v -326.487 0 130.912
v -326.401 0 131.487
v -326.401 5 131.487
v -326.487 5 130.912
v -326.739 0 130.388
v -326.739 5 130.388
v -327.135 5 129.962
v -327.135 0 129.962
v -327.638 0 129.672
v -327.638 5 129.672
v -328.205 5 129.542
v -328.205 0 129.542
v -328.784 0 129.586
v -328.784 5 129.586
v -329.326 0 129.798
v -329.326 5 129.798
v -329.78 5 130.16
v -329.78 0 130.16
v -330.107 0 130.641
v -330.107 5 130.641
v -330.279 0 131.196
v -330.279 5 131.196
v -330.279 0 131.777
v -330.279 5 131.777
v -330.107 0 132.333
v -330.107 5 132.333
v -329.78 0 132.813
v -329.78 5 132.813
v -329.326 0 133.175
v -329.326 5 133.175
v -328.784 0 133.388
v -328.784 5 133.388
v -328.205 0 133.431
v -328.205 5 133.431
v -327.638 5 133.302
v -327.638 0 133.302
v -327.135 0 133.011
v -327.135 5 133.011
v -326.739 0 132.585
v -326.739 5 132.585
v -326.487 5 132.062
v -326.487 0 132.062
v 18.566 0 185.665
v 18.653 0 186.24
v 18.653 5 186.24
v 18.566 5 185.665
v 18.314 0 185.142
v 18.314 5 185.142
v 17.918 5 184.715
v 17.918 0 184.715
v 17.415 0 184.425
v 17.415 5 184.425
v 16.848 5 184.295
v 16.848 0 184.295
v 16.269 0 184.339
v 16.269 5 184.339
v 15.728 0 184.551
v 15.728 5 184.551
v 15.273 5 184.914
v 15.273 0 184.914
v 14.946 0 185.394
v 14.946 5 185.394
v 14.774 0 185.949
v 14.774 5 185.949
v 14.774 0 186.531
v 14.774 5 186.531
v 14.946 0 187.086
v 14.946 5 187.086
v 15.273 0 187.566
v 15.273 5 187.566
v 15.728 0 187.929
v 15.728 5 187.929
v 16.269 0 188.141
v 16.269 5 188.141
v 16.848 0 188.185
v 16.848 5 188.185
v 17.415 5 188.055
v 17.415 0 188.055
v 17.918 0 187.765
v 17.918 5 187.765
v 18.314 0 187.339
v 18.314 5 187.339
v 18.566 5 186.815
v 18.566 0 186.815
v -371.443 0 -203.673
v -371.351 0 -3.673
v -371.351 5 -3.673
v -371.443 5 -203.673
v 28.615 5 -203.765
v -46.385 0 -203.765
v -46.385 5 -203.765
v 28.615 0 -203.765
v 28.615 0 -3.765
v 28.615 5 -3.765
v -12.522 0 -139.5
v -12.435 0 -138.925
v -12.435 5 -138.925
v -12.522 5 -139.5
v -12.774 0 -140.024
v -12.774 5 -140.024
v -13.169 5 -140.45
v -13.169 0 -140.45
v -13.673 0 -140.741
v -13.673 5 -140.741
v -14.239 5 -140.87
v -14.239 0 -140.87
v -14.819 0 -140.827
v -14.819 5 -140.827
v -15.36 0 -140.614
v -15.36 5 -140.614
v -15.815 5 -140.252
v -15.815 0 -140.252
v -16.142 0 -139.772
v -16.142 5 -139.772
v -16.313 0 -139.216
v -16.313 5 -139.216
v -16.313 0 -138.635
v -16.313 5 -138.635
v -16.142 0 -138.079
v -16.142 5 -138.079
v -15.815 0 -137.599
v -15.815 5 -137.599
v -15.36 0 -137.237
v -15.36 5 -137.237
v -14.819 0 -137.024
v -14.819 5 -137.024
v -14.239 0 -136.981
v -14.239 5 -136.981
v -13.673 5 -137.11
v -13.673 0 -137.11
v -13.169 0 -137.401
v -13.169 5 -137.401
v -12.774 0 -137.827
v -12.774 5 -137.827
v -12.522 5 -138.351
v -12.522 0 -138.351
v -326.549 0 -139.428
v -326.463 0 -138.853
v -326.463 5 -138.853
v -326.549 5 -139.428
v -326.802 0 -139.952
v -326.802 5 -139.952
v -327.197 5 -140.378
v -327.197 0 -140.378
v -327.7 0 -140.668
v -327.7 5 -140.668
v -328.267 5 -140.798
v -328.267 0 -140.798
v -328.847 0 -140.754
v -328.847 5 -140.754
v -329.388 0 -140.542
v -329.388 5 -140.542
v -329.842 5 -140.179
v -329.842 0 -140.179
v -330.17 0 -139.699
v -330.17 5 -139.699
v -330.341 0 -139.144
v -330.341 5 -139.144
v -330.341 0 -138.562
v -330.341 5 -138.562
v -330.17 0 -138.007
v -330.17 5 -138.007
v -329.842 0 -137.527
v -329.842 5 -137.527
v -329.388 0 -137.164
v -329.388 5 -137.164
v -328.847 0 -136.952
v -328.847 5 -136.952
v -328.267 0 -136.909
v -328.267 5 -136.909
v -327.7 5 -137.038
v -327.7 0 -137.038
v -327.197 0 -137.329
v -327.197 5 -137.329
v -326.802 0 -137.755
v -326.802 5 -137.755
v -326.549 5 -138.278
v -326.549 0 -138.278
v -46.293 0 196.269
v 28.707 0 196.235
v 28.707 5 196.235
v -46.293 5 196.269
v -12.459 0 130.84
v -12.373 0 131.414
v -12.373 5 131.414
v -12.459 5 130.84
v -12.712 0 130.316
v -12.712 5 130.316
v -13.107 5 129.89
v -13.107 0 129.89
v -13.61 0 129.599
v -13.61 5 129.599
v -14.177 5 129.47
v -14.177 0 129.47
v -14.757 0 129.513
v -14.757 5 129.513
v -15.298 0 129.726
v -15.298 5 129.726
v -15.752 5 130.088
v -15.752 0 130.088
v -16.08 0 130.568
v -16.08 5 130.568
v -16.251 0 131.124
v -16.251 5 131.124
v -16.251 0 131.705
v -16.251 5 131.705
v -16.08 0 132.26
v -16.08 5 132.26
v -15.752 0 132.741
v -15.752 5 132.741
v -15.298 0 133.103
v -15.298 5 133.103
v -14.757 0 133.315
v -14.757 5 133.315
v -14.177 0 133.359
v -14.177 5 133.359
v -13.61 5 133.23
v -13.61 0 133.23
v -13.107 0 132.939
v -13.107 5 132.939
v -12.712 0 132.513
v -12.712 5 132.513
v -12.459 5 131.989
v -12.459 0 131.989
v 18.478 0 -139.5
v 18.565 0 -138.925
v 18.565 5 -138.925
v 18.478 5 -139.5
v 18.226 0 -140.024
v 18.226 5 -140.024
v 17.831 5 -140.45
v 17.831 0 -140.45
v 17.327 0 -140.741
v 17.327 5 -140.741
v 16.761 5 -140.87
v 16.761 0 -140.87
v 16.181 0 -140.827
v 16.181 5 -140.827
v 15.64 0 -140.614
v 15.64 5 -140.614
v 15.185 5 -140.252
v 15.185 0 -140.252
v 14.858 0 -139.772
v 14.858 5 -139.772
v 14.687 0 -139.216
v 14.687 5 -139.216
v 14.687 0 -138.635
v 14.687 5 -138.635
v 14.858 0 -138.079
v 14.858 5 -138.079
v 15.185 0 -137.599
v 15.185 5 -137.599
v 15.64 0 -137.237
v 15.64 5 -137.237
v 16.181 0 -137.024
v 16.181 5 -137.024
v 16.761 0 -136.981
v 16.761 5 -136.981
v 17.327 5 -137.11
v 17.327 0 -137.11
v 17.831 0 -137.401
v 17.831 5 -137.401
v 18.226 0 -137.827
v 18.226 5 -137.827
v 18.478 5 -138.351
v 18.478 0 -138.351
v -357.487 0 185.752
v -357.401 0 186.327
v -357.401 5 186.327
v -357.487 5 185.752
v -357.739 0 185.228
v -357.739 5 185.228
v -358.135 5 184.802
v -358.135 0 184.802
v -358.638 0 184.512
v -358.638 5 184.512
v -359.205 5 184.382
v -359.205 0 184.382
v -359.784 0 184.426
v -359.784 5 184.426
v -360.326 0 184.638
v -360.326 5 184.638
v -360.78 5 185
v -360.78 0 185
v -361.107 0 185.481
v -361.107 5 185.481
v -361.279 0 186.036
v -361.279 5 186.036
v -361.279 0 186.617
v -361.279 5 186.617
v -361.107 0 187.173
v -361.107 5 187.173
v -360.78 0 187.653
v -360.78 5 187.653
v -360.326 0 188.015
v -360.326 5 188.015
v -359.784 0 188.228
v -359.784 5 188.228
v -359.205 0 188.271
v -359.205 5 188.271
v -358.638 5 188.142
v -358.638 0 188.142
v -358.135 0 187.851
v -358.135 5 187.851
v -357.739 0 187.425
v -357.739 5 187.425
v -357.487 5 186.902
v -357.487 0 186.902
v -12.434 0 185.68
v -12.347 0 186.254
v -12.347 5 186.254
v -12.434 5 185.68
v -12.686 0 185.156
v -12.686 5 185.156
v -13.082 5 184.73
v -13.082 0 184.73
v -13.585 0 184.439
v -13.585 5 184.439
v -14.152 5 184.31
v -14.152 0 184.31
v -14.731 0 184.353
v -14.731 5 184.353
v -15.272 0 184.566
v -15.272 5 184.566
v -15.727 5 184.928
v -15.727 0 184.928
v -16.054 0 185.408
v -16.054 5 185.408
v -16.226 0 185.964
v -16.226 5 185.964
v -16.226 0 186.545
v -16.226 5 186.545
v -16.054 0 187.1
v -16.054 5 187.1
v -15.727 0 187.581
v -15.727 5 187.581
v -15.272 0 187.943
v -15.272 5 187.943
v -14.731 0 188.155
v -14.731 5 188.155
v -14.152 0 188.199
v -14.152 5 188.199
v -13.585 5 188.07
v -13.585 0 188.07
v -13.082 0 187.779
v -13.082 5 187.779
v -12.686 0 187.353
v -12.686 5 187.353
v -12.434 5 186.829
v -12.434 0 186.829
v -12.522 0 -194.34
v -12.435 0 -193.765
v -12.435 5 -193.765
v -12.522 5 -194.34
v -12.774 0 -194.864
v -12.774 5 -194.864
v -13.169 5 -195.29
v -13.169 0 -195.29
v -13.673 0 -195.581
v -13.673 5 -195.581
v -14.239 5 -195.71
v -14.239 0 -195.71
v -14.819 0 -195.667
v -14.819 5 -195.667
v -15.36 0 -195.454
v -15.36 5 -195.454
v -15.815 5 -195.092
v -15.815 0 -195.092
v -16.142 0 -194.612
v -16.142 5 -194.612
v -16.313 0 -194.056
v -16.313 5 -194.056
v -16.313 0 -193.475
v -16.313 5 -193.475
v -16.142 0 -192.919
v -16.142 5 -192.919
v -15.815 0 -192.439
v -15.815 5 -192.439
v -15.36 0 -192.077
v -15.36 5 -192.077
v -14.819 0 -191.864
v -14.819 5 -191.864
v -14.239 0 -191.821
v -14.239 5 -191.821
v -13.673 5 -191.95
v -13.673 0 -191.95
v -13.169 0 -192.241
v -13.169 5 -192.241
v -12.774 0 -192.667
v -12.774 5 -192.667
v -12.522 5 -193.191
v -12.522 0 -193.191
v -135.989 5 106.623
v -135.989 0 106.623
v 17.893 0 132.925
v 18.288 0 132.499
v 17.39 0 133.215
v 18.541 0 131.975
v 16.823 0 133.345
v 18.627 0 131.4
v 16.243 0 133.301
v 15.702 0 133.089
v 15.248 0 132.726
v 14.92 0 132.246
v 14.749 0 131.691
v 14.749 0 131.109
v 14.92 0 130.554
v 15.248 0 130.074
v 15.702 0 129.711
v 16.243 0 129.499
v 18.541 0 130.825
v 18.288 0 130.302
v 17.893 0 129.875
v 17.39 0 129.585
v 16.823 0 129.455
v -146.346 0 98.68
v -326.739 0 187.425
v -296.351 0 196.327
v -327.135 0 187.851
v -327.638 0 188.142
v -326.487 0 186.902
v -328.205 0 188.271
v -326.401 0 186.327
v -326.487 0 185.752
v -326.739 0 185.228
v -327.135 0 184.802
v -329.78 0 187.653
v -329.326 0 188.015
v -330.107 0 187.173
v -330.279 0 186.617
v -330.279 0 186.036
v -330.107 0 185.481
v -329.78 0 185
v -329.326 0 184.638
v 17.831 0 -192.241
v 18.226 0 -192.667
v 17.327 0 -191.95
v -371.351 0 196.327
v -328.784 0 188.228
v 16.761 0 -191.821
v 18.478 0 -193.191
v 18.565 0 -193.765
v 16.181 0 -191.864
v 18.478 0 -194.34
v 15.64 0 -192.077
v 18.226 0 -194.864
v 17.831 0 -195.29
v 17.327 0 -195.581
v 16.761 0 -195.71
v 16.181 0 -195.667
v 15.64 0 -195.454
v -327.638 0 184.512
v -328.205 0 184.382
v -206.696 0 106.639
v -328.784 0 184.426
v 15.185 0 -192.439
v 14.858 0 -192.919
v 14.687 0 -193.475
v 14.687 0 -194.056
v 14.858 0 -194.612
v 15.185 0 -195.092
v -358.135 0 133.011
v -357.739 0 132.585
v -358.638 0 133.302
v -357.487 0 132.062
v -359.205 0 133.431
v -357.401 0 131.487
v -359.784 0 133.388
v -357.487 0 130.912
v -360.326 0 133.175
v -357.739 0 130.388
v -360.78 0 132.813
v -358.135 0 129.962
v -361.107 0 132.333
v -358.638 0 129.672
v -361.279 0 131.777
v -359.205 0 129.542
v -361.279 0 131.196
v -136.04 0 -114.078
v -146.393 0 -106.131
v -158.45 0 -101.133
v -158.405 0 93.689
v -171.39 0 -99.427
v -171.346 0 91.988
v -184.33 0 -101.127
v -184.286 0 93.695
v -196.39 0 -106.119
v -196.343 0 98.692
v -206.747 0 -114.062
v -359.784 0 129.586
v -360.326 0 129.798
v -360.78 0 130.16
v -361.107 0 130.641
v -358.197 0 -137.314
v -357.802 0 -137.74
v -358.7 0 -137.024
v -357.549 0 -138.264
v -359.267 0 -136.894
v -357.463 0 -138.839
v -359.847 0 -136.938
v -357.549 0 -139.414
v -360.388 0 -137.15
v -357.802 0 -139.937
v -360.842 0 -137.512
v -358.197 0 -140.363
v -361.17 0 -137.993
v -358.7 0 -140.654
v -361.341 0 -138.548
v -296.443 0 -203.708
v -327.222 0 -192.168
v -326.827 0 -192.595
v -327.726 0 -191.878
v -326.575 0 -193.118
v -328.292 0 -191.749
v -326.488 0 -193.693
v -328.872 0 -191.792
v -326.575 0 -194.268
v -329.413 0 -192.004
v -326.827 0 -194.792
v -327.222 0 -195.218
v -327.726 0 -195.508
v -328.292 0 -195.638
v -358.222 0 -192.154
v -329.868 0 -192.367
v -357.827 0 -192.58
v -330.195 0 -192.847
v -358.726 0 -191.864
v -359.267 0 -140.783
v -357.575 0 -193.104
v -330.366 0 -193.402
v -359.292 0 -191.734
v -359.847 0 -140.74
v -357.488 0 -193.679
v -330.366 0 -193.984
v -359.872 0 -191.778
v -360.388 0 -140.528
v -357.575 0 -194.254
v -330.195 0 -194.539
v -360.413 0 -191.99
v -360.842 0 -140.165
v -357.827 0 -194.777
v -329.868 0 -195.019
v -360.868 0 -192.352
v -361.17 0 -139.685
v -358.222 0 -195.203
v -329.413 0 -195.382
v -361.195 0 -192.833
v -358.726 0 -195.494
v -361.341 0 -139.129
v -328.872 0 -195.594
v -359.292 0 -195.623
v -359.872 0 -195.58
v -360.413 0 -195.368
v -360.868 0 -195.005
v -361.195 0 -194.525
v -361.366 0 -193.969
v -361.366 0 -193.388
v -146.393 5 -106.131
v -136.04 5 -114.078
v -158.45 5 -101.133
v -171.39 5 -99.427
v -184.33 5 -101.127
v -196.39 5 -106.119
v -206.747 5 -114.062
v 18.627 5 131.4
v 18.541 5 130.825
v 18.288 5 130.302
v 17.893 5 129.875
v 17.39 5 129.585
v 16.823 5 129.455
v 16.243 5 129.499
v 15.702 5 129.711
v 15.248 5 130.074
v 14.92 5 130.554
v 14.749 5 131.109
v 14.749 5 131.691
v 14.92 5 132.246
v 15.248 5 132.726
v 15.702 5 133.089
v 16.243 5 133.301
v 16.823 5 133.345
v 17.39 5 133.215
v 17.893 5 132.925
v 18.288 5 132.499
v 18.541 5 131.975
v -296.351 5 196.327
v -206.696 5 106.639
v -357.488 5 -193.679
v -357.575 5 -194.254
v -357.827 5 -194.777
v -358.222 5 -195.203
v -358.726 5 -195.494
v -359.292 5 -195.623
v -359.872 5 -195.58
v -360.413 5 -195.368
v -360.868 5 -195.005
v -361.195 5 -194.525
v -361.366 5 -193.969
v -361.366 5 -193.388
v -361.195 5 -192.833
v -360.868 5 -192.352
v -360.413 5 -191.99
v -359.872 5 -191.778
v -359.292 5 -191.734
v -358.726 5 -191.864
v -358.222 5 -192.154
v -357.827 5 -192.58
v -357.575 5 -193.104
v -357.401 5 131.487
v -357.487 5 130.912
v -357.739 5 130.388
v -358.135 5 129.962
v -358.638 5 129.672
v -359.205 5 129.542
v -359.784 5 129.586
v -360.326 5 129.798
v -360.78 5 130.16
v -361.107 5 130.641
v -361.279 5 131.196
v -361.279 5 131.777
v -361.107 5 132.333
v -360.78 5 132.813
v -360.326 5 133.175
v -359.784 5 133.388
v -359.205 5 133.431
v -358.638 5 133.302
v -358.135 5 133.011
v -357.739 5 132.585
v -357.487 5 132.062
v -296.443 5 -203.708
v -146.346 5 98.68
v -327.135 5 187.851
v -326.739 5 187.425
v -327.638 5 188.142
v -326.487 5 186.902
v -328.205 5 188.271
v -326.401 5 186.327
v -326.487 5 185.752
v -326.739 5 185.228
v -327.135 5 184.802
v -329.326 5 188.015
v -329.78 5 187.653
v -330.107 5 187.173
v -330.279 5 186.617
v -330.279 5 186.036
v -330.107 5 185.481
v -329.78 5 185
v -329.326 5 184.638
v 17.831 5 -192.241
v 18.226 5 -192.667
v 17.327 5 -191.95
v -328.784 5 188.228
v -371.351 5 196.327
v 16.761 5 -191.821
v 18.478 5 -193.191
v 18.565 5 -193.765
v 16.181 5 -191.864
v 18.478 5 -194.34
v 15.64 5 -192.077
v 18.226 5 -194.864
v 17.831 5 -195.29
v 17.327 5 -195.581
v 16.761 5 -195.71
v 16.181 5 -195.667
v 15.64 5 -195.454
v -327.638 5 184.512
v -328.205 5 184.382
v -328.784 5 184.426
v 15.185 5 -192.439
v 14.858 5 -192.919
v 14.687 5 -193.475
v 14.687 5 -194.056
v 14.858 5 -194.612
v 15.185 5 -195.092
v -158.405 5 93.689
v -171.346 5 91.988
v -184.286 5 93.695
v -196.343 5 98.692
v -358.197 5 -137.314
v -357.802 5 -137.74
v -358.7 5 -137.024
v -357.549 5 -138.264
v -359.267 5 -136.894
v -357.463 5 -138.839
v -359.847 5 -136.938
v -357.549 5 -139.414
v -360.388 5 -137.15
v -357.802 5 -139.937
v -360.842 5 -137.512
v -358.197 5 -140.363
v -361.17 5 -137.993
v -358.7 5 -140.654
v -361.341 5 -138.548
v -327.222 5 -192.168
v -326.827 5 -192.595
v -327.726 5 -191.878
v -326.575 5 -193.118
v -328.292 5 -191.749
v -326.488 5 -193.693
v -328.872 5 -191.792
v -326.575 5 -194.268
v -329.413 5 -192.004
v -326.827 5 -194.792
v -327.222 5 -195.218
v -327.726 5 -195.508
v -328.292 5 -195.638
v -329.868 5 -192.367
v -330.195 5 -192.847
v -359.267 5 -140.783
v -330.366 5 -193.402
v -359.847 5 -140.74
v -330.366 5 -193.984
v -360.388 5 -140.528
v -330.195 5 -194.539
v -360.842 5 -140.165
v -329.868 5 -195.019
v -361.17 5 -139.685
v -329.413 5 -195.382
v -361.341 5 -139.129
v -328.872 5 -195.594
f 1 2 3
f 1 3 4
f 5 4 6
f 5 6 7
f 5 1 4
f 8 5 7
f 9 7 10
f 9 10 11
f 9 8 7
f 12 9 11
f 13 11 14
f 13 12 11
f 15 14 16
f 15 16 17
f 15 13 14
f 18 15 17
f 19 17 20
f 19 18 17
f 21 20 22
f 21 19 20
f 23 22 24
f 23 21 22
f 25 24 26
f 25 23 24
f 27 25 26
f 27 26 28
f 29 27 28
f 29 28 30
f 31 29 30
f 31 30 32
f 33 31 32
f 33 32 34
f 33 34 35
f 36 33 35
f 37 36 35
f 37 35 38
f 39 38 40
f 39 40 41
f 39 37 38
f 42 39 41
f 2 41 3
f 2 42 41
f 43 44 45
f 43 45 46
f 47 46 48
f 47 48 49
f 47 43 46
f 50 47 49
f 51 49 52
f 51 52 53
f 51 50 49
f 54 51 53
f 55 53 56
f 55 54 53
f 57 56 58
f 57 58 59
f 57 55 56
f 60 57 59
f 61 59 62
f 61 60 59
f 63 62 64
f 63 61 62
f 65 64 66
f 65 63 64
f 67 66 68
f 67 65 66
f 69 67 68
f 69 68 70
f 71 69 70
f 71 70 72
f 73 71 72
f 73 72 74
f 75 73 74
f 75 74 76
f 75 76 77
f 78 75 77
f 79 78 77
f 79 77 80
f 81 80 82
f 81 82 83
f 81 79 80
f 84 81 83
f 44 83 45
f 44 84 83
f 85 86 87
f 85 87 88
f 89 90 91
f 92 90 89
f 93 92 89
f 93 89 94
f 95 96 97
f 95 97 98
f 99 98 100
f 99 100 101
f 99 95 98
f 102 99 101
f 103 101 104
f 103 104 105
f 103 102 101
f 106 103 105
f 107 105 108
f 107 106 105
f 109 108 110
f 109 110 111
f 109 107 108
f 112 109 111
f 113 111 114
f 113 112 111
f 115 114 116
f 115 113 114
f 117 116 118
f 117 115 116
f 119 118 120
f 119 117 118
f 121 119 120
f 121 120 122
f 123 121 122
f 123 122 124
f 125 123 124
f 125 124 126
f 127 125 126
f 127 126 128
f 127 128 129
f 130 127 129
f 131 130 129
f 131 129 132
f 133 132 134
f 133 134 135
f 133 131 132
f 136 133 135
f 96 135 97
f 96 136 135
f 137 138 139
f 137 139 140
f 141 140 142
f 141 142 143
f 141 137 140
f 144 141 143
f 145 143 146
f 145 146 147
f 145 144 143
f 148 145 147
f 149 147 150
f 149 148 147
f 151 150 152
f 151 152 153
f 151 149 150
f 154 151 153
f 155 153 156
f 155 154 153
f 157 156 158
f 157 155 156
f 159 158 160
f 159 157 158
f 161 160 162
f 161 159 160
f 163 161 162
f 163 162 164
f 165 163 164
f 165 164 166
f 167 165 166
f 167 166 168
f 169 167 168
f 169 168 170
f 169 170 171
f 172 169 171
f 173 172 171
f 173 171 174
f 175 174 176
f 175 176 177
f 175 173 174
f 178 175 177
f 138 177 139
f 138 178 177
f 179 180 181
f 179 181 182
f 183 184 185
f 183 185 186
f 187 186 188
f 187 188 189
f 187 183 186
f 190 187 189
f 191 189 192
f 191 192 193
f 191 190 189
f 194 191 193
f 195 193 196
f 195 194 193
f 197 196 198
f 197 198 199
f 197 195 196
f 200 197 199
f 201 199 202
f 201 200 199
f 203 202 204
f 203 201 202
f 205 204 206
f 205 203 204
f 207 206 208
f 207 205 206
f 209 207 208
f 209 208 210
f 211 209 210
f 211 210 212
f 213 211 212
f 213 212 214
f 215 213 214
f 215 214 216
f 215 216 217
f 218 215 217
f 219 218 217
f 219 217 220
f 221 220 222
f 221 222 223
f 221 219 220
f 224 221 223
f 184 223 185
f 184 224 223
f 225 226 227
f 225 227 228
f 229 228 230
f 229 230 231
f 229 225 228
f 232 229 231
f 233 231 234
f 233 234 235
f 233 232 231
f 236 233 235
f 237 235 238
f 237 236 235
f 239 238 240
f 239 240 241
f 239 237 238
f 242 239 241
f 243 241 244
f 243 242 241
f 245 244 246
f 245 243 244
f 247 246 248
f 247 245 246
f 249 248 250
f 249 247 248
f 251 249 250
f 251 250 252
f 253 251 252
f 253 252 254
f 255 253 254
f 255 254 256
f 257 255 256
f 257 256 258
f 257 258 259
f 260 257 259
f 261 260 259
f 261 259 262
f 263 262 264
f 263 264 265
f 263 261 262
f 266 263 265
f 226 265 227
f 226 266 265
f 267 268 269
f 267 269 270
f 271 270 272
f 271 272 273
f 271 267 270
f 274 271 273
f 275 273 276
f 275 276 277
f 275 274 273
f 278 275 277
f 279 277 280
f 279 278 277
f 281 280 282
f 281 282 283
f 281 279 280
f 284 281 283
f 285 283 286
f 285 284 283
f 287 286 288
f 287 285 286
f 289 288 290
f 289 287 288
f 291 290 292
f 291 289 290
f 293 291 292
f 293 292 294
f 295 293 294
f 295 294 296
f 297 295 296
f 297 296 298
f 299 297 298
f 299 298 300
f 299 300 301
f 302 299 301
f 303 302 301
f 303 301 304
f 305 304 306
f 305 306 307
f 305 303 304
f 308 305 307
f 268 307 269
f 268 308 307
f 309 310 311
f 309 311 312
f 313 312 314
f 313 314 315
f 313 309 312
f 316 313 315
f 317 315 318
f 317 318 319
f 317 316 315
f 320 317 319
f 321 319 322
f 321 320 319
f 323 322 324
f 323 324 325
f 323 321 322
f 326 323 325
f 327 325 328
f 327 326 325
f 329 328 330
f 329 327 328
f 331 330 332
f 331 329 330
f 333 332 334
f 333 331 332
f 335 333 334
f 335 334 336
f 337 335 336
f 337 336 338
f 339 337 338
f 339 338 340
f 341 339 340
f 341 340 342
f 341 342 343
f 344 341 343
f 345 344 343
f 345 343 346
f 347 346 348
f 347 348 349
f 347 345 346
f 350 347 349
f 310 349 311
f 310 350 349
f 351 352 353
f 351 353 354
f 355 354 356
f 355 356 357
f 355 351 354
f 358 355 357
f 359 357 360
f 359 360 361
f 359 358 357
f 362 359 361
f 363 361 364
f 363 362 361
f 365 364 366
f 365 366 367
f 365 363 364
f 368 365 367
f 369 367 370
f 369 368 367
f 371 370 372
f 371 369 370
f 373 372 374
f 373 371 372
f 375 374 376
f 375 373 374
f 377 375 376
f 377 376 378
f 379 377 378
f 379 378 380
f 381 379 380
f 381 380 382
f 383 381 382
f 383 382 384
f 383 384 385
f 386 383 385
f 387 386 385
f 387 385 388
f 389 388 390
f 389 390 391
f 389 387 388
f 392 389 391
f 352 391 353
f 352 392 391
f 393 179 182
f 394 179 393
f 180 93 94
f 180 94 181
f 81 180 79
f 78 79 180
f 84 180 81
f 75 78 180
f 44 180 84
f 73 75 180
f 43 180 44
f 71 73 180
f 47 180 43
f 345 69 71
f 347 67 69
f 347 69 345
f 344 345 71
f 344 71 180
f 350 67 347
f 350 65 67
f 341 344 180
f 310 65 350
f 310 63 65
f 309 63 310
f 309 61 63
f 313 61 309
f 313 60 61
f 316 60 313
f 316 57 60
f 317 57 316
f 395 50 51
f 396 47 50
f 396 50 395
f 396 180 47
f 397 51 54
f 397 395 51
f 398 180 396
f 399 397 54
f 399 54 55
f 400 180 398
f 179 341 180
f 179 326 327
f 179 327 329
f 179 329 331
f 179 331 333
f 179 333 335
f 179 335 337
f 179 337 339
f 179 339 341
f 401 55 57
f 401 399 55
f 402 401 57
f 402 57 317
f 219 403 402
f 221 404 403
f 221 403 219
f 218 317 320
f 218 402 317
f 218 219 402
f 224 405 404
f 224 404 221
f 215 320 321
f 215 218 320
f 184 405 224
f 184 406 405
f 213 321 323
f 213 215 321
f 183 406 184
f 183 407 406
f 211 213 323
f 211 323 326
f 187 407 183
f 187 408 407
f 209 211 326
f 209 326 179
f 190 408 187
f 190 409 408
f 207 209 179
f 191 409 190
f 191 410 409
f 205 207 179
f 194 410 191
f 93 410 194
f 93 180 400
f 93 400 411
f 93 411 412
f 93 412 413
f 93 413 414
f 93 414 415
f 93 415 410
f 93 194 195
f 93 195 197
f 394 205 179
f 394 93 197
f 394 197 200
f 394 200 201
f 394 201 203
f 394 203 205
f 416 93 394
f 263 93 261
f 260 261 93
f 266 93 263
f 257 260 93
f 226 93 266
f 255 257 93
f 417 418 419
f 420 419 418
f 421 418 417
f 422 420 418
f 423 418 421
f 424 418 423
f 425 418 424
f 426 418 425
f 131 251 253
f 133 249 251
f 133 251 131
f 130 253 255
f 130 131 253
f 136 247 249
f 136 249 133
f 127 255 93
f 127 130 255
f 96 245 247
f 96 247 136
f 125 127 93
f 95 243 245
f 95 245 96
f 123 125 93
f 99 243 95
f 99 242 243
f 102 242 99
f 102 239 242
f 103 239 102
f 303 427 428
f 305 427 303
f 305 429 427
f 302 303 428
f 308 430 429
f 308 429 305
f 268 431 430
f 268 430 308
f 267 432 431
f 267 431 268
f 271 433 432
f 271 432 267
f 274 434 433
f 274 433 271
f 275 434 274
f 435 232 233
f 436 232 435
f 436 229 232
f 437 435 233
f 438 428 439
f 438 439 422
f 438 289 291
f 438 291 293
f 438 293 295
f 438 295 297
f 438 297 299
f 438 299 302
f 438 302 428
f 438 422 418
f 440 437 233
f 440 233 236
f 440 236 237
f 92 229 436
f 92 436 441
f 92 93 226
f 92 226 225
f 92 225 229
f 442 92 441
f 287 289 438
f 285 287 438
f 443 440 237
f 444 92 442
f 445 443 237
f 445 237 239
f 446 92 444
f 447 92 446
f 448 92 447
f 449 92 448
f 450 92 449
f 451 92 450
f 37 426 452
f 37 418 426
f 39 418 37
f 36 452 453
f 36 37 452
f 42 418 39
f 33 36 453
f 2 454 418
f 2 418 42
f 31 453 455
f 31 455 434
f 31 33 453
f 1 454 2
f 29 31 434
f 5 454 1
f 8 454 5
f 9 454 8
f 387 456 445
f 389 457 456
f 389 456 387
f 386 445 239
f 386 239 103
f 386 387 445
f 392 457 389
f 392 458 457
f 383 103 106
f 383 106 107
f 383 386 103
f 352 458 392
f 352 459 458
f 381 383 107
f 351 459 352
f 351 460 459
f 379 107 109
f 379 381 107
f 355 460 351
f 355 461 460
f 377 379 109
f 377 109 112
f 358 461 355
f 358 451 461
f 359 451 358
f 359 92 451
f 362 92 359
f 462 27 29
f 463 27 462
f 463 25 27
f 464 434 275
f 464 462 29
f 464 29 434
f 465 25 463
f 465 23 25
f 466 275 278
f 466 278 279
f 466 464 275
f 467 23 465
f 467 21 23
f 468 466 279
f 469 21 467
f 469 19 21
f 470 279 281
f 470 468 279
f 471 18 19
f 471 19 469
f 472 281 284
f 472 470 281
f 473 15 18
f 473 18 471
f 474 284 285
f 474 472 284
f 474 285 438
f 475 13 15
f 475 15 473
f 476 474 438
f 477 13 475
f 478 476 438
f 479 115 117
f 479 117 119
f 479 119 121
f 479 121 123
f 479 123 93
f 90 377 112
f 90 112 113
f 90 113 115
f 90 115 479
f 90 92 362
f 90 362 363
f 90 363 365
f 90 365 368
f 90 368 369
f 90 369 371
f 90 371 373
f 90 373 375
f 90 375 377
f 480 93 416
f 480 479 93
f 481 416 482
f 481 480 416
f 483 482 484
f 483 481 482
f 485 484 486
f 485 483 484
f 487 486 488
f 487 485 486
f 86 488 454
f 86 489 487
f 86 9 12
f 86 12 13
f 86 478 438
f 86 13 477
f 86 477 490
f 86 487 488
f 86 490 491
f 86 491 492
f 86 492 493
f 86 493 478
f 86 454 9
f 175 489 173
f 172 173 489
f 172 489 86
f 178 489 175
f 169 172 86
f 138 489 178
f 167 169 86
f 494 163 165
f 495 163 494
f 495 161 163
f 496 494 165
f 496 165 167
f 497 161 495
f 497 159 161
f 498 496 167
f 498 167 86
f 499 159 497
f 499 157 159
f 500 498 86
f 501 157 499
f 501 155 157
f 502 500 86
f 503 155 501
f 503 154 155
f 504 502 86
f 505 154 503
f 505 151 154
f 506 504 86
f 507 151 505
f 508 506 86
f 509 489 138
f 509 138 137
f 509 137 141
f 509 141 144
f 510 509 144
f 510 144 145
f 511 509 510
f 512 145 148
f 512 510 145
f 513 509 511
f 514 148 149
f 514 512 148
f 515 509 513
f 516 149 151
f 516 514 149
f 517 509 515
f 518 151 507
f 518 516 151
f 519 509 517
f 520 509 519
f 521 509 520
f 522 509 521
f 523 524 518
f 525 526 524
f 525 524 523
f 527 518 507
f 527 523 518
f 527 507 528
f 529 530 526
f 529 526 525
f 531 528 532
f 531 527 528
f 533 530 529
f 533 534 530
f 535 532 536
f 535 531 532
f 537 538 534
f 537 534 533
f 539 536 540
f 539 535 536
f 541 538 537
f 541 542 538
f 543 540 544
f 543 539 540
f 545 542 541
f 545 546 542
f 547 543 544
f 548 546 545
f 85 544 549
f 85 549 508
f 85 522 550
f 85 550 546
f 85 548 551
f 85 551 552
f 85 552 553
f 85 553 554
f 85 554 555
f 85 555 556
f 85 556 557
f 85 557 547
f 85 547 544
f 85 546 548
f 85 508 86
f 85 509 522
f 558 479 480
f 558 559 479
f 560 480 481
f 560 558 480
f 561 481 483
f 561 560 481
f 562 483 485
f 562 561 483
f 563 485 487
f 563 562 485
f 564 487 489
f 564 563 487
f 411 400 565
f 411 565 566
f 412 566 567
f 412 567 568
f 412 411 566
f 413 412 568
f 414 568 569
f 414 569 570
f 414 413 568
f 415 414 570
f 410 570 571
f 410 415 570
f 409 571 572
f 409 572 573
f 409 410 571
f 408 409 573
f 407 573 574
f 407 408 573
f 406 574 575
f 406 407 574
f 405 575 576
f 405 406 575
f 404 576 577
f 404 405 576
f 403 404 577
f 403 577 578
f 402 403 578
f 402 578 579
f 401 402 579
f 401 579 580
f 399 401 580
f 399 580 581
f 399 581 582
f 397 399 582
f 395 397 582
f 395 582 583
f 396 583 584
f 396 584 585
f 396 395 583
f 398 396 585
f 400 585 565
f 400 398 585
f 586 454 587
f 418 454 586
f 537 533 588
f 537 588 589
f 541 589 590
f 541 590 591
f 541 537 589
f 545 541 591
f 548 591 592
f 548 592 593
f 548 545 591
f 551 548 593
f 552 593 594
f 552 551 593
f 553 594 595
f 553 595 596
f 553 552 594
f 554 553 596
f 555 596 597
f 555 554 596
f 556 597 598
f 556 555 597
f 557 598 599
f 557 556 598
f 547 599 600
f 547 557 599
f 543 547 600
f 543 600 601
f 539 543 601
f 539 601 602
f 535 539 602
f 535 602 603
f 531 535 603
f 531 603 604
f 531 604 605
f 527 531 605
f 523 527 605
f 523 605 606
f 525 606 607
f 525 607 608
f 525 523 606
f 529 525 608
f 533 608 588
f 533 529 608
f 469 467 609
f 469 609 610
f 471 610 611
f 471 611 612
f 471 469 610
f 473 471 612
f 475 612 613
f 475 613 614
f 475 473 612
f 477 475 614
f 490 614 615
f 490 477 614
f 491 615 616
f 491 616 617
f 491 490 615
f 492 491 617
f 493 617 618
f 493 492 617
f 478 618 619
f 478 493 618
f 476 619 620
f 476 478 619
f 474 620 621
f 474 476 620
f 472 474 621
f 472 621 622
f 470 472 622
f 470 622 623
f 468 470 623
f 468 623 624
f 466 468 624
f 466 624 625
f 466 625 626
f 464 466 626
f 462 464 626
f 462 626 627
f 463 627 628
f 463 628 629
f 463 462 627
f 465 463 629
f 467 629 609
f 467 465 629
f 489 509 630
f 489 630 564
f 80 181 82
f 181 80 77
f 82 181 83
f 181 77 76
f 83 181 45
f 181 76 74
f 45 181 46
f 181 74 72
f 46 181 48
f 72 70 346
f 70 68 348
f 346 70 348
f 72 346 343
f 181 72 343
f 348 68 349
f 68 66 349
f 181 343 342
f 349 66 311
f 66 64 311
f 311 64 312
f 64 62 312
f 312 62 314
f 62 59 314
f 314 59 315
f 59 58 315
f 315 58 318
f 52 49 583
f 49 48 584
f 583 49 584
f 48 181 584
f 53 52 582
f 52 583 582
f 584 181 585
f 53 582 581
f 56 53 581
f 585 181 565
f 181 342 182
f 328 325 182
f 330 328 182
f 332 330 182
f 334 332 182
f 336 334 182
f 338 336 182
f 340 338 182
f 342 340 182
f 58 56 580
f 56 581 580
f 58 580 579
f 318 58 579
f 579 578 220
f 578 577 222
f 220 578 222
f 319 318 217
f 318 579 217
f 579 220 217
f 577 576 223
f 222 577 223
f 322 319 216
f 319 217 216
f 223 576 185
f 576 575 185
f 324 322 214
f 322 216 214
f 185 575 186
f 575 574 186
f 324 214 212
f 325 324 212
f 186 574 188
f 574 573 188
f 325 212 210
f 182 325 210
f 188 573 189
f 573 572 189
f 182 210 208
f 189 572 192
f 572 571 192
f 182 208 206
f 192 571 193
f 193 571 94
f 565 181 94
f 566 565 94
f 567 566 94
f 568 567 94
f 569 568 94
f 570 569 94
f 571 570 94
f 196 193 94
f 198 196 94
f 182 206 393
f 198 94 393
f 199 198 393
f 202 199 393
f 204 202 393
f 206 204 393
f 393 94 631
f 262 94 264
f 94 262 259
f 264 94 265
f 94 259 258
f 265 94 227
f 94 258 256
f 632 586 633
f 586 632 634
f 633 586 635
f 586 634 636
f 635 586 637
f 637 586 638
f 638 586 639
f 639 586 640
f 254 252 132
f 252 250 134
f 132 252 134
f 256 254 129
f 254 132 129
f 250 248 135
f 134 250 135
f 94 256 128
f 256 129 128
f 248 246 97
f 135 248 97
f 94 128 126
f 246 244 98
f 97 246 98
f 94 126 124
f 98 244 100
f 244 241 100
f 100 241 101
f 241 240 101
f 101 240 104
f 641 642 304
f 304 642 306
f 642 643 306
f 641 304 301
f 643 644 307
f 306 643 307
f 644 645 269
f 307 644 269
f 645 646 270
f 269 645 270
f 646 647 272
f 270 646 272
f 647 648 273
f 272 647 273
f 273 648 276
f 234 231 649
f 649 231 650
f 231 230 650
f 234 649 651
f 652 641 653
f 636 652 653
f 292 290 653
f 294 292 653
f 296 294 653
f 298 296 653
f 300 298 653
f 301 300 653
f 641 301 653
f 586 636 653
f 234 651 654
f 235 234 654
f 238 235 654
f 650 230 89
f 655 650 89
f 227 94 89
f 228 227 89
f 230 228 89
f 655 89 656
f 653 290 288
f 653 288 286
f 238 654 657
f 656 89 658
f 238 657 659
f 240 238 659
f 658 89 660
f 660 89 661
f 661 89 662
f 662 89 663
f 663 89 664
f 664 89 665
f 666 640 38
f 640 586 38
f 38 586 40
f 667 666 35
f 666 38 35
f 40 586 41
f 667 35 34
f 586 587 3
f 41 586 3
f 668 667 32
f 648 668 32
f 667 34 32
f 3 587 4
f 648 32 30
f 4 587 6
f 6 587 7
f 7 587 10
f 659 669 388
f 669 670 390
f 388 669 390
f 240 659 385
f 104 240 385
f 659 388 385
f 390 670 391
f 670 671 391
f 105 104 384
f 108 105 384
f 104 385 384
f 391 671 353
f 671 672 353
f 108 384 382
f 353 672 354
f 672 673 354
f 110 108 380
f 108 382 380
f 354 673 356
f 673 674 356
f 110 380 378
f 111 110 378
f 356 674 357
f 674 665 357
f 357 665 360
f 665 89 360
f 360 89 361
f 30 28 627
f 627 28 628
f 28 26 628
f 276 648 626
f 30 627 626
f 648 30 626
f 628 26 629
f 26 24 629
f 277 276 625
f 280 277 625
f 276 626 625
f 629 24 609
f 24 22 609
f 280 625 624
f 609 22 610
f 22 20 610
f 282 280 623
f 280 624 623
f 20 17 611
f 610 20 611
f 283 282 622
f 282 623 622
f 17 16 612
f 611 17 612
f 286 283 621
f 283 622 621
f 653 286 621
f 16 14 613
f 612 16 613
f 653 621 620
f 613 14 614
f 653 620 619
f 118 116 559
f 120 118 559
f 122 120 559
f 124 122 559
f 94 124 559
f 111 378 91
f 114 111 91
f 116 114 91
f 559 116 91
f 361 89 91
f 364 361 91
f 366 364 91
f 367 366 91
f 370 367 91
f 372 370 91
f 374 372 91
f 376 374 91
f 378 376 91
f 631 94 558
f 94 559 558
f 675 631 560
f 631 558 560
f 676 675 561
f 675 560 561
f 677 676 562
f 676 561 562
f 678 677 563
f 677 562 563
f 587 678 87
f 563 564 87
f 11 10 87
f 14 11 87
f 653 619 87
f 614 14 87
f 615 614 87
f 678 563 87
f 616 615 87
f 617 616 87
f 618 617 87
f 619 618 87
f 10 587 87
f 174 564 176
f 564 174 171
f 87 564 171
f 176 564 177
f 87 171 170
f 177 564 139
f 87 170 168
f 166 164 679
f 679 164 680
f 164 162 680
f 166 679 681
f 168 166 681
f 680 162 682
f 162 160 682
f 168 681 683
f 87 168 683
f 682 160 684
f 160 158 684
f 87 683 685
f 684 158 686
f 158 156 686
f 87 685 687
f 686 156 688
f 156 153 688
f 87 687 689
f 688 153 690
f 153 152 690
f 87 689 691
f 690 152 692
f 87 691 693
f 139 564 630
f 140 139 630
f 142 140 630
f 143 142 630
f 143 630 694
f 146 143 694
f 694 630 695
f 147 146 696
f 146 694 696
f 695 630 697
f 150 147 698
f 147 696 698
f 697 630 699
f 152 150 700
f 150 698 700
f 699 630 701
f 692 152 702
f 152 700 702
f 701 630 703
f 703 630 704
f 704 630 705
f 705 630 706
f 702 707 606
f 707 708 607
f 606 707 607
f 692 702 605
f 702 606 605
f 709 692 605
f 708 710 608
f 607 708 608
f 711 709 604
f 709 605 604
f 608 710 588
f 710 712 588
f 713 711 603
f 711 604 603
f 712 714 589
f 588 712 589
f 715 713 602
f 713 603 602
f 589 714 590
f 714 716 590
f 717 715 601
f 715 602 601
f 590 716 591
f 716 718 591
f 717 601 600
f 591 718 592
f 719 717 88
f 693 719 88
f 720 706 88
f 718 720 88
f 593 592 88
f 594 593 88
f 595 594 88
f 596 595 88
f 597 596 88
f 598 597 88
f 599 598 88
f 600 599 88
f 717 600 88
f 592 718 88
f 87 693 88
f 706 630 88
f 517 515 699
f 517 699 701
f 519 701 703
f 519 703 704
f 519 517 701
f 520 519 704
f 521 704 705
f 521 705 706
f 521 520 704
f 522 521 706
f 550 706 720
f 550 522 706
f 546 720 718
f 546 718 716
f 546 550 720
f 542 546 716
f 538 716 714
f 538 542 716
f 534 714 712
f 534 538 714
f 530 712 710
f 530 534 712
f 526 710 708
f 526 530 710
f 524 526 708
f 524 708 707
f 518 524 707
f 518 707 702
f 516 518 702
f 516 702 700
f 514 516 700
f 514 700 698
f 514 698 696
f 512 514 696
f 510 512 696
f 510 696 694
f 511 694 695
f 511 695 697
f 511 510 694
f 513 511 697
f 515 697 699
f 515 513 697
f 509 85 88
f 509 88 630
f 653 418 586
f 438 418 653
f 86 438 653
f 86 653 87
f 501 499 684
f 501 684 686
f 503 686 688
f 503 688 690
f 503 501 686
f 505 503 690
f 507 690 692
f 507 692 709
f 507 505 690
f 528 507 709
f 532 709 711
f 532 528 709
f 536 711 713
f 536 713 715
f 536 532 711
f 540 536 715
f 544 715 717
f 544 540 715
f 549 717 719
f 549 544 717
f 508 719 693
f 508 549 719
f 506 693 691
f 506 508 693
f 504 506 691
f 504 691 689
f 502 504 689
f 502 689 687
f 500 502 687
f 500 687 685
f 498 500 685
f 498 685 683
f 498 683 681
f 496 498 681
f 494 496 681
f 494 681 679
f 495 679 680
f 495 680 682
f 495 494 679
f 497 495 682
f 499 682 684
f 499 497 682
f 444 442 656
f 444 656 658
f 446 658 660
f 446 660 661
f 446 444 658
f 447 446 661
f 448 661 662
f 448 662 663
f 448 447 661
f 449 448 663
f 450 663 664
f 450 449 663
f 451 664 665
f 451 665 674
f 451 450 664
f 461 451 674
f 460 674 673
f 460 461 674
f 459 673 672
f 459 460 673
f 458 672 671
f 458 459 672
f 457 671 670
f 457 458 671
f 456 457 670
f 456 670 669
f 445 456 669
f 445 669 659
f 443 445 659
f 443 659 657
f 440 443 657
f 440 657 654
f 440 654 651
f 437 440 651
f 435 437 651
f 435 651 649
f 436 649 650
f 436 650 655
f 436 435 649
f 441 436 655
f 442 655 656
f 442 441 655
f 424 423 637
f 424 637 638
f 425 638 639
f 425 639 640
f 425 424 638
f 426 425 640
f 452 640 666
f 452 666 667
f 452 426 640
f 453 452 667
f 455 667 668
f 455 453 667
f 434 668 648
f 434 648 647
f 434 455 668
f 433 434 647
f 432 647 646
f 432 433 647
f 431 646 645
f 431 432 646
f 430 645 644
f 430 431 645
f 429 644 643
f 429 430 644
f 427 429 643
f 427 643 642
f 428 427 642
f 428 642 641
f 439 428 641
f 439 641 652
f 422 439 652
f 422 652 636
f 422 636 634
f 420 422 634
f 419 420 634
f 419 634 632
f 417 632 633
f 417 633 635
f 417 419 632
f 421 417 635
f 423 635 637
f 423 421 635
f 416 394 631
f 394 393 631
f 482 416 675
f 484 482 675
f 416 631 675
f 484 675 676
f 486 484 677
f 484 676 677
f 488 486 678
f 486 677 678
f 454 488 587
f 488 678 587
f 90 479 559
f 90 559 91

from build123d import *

# Parameters (mm, degrees)
SKETCH1_R           = 1.95
BOSS_EXTRUDE1_DEPTH = 5
FILLET1_R           = 50


with BuildPart() as part:
    # Sketch1 → Boss-Extrude1 (new body)
    with BuildSketch(Plane(origin=(0, 0, 0), x_dir=(1, 0, 0), z_dir=(0, 1, 0))):
        Polygon((-171.385103045, 78.719364296), (-46.385103045, 203.765478515), (28.614896955, 203.765478515), (28.614896955, 3.765478515), (28.707125389, -196.23450022), (-46.292866637, -196.269085883), (-171.350517383, -71.28062773), (-296.350517383, -196.326741949), (-371.350517383, -196.326741949), (-371.350517383, 3.673258051), (-371.442745817, 203.673236785), (-296.442753791, 203.707822448), align=None)
        with Locations((16.614896955, 193.765478515)):
            Circle(SKETCH1_R, mode=Mode.SUBTRACT)
        with Locations((-14.385103045, 193.765478515)):
            Circle(SKETCH1_R, mode=Mode.SUBTRACT)
        with Locations((-14.385103045, 138.925478515)):
            Circle(SKETCH1_R, mode=Mode.SUBTRACT)
        with Locations((16.614896955, 138.925478515)):
            Circle(SKETCH1_R, mode=Mode.SUBTRACT)
        with Locations((16.677226206, -131.40004082)):
            Circle(SKETCH1_R, mode=Mode.SUBTRACT)
        with Locations((-14.322770498, -131.414336227)):
            Circle(SKETCH1_R, mode=Mode.SUBTRACT)
        with Locations((16.702515243, -186.240034989)):
            Circle(SKETCH1_R, mode=Mode.SUBTRACT)
        with Locations((-14.297481461, -186.254330396)):
            Circle(SKETCH1_R, mode=Mode.SUBTRACT)
        with Locations((-328.350517383, -186.326741949)):
            Circle(SKETCH1_R, mode=Mode.SUBTRACT)
        with Locations((-359.350517383, -186.326741949)):
            Circle(SKETCH1_R, mode=Mode.SUBTRACT)
        with Locations((-328.350517383, -131.486741949)):
            Circle(SKETCH1_R, mode=Mode.SUBTRACT)
        with Locations((-359.350517383, -131.486741949)):
            Circle(SKETCH1_R, mode=Mode.SUBTRACT)
        with Locations((-359.412846634, 138.838777386)):
            Circle(SKETCH1_R, mode=Mode.SUBTRACT)
        with Locations((-328.41284993, 138.853072793)):
            Circle(SKETCH1_R, mode=Mode.SUBTRACT)
        with Locations((-328.438138967, 193.693066962)):
            Circle(SKETCH1_R, mode=Mode.SUBTRACT)
        with Locations((-359.438135671, 193.678771555)):
            Circle(SKETCH1_R, mode=Mode.SUBTRACT)
    extrude(amount=BOSS_EXTRUDE1_DEPTH)

    # Fillet1
    fillet1_edges = [part.edges().sort_by_distance(p)[0] for p in [
        (-171.385103045, 2.5, -78.719364296),
        (-171.350517383, 2.5, 71.28062773),
    ]]
    fillet(fillet1_edges, radius=FILLET1_R)


solid = part.part
